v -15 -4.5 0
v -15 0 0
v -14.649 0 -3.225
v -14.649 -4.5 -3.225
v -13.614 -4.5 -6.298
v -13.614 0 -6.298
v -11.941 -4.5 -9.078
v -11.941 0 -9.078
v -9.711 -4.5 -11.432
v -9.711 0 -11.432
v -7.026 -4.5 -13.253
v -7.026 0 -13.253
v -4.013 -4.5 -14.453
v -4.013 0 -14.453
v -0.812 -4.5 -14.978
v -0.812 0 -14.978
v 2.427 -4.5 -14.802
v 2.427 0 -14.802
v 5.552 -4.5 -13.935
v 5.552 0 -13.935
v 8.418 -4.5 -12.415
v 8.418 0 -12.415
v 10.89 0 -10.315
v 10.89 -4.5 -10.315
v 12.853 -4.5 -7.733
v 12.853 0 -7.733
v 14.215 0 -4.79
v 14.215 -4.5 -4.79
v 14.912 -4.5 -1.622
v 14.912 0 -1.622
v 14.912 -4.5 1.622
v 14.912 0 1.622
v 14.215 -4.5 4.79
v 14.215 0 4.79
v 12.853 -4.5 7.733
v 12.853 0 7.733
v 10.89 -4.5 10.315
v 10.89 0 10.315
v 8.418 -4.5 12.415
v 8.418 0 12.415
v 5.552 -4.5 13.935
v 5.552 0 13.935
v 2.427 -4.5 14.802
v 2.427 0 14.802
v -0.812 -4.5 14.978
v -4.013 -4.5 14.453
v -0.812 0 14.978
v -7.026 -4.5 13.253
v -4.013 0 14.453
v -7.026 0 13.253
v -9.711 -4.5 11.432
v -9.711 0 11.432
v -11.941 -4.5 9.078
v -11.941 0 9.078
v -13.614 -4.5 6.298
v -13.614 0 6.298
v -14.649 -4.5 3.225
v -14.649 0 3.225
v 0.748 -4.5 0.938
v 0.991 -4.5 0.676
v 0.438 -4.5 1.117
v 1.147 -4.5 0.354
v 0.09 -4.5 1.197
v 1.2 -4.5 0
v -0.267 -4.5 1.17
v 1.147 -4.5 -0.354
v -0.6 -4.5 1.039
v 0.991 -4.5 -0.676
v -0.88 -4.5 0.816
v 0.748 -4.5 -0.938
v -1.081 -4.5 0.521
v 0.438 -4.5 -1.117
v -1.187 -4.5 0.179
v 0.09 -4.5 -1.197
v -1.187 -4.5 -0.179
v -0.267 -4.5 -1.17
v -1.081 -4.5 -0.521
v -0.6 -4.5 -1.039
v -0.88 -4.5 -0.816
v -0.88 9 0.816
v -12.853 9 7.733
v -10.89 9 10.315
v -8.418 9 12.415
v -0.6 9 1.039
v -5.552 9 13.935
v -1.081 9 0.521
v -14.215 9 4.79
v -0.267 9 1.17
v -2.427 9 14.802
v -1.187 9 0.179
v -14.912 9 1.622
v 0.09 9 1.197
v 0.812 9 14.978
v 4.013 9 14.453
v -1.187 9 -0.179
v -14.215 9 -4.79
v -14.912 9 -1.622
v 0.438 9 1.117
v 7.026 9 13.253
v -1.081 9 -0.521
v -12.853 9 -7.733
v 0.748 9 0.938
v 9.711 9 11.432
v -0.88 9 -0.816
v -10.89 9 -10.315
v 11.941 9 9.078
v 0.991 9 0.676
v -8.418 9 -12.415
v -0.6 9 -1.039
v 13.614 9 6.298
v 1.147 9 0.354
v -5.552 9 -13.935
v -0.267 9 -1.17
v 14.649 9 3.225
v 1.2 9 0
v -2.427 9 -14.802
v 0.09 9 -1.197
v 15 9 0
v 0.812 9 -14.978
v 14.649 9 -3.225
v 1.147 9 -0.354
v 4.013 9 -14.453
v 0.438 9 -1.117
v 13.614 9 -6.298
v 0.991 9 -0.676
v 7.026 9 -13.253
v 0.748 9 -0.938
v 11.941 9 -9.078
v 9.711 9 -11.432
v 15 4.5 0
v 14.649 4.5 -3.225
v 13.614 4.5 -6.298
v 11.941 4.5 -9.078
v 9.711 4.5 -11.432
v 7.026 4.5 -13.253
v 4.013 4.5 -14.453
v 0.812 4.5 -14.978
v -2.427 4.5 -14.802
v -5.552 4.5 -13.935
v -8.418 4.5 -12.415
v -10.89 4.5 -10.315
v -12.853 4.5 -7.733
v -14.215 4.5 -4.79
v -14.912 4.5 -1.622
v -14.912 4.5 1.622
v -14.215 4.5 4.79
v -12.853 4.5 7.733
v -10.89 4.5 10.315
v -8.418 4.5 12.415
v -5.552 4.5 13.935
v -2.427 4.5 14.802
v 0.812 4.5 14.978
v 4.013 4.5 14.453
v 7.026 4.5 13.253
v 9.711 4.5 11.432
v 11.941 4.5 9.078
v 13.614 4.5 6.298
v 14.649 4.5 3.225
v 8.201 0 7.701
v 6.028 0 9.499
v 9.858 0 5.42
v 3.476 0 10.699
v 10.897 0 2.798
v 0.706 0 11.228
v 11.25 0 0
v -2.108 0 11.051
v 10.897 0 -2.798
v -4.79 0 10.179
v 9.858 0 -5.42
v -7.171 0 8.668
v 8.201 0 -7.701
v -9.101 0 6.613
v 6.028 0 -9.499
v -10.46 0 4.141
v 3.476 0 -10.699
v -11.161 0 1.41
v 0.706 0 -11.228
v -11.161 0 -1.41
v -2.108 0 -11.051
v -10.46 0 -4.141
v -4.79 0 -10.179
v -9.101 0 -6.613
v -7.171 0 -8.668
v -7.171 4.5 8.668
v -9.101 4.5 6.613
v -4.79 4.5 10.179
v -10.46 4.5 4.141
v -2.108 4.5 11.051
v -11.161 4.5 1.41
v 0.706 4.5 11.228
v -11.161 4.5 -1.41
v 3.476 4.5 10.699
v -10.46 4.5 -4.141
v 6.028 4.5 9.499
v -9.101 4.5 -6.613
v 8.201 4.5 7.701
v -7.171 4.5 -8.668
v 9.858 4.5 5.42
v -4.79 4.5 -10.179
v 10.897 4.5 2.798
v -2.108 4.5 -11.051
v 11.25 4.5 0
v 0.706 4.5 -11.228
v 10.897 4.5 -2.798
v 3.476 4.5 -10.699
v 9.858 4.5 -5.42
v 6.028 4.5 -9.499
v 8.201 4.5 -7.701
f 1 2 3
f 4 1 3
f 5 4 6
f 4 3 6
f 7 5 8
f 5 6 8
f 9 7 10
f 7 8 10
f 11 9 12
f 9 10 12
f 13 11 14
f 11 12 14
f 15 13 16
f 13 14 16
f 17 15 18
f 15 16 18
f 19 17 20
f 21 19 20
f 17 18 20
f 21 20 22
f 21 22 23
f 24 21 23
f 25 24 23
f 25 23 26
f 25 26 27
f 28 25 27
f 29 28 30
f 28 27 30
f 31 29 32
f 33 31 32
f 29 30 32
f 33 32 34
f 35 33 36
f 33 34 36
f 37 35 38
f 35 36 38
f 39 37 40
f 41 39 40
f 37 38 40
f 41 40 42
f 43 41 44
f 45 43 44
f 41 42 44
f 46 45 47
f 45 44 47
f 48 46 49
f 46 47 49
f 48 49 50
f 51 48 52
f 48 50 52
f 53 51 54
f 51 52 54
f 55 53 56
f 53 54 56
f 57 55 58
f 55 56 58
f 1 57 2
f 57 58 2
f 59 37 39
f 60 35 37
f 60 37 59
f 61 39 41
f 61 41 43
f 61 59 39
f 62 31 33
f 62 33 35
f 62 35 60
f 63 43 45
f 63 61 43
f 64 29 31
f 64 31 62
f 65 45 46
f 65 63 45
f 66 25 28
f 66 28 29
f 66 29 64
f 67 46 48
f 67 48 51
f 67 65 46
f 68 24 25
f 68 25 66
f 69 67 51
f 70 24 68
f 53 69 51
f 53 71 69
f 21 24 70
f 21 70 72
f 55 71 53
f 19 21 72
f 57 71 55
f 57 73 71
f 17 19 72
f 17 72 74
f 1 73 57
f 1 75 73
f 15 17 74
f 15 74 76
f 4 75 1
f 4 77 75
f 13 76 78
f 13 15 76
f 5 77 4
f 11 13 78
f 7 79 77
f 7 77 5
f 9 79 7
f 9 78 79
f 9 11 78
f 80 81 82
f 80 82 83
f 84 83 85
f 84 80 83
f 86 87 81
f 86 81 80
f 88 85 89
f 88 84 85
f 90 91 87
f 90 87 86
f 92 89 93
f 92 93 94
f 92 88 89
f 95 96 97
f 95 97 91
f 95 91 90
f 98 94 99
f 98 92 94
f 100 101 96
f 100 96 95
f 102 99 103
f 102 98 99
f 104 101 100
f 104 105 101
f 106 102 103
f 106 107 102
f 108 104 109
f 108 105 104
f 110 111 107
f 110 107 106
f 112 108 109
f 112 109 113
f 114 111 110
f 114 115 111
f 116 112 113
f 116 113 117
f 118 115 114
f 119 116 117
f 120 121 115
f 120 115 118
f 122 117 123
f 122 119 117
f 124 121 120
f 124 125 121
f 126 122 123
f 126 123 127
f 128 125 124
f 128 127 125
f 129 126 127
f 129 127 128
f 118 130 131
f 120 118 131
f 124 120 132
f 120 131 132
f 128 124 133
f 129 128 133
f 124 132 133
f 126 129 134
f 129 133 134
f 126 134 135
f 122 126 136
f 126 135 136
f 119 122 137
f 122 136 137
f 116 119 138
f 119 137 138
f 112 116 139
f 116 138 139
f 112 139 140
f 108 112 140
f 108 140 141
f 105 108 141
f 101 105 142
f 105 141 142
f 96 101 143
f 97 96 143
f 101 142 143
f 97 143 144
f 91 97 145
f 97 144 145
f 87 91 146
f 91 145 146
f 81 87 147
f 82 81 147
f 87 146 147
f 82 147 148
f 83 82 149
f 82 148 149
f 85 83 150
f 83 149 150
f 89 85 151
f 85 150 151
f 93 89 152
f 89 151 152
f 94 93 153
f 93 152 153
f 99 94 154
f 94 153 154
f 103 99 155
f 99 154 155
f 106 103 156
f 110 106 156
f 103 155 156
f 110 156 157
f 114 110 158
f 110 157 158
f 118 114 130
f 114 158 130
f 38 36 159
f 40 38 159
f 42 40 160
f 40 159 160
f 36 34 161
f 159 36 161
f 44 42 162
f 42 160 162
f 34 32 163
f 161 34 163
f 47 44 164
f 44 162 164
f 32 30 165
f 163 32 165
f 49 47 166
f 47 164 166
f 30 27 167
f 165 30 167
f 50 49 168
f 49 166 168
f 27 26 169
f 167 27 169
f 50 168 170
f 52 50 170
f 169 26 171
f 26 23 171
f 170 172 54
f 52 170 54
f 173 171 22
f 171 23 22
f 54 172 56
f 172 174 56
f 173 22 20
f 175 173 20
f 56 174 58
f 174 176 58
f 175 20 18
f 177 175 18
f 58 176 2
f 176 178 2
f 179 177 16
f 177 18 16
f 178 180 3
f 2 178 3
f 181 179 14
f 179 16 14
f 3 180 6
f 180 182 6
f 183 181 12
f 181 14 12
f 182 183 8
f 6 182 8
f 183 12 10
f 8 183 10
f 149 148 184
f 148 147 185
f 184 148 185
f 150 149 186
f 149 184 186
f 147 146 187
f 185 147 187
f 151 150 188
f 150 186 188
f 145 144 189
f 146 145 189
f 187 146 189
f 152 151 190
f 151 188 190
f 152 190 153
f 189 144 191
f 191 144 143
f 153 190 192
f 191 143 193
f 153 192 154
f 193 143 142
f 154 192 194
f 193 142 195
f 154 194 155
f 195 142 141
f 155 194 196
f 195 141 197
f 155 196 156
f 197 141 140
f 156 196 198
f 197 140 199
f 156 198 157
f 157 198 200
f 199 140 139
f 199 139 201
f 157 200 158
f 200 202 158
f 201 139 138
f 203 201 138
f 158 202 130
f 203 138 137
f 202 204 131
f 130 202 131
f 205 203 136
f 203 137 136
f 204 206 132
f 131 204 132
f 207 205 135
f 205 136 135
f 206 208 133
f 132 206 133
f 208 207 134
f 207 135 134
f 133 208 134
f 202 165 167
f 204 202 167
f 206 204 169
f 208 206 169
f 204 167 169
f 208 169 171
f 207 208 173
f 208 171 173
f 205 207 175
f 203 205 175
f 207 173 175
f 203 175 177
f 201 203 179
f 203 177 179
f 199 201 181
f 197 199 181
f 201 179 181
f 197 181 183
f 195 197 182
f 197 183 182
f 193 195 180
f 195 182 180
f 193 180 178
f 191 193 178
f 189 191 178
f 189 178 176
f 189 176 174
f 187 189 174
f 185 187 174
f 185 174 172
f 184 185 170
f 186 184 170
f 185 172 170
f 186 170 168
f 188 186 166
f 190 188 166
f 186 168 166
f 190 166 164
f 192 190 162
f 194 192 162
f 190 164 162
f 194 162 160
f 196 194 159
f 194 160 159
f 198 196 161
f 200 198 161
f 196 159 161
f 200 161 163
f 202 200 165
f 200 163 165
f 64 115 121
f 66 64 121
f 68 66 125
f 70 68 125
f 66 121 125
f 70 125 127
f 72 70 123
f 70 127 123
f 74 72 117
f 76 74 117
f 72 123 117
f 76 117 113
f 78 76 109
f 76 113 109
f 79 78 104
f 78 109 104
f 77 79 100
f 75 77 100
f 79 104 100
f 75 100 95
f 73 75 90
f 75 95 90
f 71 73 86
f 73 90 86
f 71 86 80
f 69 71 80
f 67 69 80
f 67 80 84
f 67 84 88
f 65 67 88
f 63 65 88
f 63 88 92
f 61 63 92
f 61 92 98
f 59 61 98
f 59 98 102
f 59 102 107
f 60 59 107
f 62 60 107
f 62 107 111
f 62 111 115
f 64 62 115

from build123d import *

# Parameters (mm, degrees)
SKETCH1_R            = 11.25
BOSS_EXTRUDE1_DEPTH  = 4.5
SKETCH2_R            = 15
BOSS_EXTRUDE2_DEPTH  = 4.5
SKETCH3_R            = 15
BOSS_EXTRUDE3_DEPTH  = 4.5
M2_CLEARANCE_HOLE1_D = 2.4


with BuildPart() as part:
    # Sketch1 → Boss-Extrude1 (new body)
    with BuildSketch(Plane(origin=(0, 0, 0), x_dir=(1, 0, 0), z_dir=(0, 1, 0))):
        Circle(SKETCH1_R)
    extrude(amount=BOSS_EXTRUDE1_DEPTH)

    # Sketch2 → Boss-Extrude2 (add)
    with BuildSketch(Plane(origin=(0, 4.5, 0), x_dir=(1, 0, 0), z_dir=(0, 1, 0))):
        Circle(SKETCH2_R)
    extrude(amount=BOSS_EXTRUDE2_DEPTH)

    # Sketch3 → Boss-Extrude3 (add)
    with BuildSketch(Plane(origin=(0, 0, 0), x_dir=(-1, 0, 0), z_dir=(0, -1, 0))):
        Circle(SKETCH3_R)
    extrude(amount=BOSS_EXTRUDE3_DEPTH)

    # M2 Clearance Hole1 (through all)
    with Locations(Plane(origin=(0, -4.5, 0), x_dir=(-1, 0, 0), z_dir=(0, -1, 0))):
        with Locations((0, 0)):
            Hole(M2_CLEARANCE_HOLE1_D / 2)


solid = part.part
